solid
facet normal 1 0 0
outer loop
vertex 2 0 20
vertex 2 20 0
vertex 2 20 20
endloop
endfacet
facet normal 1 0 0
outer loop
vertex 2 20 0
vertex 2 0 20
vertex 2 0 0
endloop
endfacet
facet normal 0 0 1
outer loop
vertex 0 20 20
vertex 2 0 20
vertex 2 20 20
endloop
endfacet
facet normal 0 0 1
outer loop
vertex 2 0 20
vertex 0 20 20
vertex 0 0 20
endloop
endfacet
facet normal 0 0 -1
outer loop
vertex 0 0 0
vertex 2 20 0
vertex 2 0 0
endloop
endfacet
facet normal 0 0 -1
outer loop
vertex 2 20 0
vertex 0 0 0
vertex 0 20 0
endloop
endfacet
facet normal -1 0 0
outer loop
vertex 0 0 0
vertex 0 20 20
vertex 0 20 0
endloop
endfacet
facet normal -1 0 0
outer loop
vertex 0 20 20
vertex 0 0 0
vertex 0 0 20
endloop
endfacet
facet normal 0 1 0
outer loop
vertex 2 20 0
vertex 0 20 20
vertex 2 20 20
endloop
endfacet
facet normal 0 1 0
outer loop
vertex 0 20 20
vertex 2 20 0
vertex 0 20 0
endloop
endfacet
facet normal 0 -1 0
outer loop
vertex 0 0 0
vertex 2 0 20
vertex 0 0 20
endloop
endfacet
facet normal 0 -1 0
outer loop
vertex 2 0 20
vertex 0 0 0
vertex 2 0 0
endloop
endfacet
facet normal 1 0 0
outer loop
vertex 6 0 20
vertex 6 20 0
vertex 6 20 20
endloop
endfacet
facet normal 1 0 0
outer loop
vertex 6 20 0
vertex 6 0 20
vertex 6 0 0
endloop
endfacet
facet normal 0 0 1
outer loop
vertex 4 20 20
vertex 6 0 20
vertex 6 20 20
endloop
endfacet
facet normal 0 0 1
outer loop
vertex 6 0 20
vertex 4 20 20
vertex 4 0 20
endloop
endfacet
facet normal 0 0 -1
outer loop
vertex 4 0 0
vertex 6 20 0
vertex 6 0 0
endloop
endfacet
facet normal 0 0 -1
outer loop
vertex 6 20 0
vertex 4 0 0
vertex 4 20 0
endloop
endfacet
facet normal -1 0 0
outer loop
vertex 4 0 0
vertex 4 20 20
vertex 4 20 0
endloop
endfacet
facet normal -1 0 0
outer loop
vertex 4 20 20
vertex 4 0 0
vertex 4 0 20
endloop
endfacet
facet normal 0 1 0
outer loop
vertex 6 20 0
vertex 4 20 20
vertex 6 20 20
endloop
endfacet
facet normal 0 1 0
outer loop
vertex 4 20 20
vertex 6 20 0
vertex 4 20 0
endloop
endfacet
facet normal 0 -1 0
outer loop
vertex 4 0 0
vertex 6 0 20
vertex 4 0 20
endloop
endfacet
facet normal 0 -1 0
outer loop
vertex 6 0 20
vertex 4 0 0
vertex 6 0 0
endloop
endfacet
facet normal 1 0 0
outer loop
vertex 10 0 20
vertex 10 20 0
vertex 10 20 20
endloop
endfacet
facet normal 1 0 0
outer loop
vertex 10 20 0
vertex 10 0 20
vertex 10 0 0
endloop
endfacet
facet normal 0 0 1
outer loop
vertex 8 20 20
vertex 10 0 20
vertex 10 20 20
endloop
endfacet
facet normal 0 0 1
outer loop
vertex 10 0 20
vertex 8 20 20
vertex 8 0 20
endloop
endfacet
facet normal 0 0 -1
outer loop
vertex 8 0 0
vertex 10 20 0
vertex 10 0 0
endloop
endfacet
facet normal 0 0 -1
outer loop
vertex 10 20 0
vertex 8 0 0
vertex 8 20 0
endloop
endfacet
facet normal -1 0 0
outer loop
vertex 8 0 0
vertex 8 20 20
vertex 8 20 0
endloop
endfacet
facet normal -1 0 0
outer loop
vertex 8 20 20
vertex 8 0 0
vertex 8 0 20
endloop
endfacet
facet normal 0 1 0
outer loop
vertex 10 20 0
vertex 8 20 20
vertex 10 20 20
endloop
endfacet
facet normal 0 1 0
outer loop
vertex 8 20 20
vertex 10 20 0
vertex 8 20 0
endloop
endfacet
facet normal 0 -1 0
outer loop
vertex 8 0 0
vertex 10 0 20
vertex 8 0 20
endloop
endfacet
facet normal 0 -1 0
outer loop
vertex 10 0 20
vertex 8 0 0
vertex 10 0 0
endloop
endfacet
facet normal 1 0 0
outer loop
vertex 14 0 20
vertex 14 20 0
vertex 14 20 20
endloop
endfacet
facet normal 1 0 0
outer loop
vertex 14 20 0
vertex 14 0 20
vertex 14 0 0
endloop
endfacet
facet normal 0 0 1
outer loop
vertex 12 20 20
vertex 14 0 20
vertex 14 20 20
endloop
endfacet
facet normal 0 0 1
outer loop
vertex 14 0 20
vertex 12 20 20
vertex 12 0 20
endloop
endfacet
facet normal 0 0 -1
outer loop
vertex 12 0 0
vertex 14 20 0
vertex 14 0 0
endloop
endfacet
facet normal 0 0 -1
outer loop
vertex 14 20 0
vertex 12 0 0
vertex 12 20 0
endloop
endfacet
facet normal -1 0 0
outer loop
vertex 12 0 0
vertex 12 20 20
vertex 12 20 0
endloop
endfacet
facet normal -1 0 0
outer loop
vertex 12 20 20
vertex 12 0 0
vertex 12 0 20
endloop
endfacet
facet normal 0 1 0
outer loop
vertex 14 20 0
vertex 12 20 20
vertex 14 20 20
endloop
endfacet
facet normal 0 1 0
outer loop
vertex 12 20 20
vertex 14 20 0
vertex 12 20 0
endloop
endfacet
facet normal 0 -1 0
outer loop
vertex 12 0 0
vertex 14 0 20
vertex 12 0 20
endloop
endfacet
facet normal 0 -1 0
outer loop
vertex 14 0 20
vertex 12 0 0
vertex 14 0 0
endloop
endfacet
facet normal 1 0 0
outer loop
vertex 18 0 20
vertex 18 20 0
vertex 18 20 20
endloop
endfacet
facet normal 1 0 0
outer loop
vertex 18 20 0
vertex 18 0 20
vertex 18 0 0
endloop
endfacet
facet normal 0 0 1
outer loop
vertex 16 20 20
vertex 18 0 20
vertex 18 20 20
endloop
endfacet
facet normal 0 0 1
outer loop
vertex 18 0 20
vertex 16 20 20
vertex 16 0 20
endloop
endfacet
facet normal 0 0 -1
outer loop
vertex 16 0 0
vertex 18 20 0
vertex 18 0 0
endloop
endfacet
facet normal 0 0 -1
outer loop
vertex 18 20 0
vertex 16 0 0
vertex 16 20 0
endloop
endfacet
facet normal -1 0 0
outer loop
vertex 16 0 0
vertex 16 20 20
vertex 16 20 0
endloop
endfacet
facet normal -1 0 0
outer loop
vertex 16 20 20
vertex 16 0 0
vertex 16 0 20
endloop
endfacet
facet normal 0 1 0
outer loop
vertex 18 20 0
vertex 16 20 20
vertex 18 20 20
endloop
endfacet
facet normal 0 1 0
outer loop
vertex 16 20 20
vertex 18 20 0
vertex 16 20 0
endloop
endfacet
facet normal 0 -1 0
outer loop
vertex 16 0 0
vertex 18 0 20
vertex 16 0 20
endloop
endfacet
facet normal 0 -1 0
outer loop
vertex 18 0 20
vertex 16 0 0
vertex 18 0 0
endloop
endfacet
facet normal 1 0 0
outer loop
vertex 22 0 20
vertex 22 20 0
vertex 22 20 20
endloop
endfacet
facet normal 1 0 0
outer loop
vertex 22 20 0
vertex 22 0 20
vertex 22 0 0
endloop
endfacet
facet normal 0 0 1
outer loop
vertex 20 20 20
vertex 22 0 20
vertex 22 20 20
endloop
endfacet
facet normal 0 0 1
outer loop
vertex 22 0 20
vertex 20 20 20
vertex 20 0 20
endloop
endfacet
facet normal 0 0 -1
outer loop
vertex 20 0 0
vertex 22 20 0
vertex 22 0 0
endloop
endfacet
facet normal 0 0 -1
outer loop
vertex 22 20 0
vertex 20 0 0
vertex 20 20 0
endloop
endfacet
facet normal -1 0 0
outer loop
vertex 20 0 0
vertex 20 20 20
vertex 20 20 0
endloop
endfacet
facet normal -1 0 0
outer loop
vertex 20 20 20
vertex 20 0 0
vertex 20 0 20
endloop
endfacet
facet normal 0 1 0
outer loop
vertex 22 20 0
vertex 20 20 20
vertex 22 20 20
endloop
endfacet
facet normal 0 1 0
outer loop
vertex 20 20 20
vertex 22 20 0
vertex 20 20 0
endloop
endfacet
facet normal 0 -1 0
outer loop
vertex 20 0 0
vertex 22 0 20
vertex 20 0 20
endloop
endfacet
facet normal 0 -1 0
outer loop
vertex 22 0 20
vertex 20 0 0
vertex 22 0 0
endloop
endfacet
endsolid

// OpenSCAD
module supportedCube(x,y,z,space,thickness)
{
    width=space + thickness;
    color([0,1,0])lineup(0,width, x){ cube([thickness,y,z]) ;}
    
        
}

module lineup(start,step, end) 
{
    for (i = [start : step : end])
        {
            translate([ i, 0, 0 ]) children(0);
            
        }
}

 
supportedCube(20,20,20,2,2);
